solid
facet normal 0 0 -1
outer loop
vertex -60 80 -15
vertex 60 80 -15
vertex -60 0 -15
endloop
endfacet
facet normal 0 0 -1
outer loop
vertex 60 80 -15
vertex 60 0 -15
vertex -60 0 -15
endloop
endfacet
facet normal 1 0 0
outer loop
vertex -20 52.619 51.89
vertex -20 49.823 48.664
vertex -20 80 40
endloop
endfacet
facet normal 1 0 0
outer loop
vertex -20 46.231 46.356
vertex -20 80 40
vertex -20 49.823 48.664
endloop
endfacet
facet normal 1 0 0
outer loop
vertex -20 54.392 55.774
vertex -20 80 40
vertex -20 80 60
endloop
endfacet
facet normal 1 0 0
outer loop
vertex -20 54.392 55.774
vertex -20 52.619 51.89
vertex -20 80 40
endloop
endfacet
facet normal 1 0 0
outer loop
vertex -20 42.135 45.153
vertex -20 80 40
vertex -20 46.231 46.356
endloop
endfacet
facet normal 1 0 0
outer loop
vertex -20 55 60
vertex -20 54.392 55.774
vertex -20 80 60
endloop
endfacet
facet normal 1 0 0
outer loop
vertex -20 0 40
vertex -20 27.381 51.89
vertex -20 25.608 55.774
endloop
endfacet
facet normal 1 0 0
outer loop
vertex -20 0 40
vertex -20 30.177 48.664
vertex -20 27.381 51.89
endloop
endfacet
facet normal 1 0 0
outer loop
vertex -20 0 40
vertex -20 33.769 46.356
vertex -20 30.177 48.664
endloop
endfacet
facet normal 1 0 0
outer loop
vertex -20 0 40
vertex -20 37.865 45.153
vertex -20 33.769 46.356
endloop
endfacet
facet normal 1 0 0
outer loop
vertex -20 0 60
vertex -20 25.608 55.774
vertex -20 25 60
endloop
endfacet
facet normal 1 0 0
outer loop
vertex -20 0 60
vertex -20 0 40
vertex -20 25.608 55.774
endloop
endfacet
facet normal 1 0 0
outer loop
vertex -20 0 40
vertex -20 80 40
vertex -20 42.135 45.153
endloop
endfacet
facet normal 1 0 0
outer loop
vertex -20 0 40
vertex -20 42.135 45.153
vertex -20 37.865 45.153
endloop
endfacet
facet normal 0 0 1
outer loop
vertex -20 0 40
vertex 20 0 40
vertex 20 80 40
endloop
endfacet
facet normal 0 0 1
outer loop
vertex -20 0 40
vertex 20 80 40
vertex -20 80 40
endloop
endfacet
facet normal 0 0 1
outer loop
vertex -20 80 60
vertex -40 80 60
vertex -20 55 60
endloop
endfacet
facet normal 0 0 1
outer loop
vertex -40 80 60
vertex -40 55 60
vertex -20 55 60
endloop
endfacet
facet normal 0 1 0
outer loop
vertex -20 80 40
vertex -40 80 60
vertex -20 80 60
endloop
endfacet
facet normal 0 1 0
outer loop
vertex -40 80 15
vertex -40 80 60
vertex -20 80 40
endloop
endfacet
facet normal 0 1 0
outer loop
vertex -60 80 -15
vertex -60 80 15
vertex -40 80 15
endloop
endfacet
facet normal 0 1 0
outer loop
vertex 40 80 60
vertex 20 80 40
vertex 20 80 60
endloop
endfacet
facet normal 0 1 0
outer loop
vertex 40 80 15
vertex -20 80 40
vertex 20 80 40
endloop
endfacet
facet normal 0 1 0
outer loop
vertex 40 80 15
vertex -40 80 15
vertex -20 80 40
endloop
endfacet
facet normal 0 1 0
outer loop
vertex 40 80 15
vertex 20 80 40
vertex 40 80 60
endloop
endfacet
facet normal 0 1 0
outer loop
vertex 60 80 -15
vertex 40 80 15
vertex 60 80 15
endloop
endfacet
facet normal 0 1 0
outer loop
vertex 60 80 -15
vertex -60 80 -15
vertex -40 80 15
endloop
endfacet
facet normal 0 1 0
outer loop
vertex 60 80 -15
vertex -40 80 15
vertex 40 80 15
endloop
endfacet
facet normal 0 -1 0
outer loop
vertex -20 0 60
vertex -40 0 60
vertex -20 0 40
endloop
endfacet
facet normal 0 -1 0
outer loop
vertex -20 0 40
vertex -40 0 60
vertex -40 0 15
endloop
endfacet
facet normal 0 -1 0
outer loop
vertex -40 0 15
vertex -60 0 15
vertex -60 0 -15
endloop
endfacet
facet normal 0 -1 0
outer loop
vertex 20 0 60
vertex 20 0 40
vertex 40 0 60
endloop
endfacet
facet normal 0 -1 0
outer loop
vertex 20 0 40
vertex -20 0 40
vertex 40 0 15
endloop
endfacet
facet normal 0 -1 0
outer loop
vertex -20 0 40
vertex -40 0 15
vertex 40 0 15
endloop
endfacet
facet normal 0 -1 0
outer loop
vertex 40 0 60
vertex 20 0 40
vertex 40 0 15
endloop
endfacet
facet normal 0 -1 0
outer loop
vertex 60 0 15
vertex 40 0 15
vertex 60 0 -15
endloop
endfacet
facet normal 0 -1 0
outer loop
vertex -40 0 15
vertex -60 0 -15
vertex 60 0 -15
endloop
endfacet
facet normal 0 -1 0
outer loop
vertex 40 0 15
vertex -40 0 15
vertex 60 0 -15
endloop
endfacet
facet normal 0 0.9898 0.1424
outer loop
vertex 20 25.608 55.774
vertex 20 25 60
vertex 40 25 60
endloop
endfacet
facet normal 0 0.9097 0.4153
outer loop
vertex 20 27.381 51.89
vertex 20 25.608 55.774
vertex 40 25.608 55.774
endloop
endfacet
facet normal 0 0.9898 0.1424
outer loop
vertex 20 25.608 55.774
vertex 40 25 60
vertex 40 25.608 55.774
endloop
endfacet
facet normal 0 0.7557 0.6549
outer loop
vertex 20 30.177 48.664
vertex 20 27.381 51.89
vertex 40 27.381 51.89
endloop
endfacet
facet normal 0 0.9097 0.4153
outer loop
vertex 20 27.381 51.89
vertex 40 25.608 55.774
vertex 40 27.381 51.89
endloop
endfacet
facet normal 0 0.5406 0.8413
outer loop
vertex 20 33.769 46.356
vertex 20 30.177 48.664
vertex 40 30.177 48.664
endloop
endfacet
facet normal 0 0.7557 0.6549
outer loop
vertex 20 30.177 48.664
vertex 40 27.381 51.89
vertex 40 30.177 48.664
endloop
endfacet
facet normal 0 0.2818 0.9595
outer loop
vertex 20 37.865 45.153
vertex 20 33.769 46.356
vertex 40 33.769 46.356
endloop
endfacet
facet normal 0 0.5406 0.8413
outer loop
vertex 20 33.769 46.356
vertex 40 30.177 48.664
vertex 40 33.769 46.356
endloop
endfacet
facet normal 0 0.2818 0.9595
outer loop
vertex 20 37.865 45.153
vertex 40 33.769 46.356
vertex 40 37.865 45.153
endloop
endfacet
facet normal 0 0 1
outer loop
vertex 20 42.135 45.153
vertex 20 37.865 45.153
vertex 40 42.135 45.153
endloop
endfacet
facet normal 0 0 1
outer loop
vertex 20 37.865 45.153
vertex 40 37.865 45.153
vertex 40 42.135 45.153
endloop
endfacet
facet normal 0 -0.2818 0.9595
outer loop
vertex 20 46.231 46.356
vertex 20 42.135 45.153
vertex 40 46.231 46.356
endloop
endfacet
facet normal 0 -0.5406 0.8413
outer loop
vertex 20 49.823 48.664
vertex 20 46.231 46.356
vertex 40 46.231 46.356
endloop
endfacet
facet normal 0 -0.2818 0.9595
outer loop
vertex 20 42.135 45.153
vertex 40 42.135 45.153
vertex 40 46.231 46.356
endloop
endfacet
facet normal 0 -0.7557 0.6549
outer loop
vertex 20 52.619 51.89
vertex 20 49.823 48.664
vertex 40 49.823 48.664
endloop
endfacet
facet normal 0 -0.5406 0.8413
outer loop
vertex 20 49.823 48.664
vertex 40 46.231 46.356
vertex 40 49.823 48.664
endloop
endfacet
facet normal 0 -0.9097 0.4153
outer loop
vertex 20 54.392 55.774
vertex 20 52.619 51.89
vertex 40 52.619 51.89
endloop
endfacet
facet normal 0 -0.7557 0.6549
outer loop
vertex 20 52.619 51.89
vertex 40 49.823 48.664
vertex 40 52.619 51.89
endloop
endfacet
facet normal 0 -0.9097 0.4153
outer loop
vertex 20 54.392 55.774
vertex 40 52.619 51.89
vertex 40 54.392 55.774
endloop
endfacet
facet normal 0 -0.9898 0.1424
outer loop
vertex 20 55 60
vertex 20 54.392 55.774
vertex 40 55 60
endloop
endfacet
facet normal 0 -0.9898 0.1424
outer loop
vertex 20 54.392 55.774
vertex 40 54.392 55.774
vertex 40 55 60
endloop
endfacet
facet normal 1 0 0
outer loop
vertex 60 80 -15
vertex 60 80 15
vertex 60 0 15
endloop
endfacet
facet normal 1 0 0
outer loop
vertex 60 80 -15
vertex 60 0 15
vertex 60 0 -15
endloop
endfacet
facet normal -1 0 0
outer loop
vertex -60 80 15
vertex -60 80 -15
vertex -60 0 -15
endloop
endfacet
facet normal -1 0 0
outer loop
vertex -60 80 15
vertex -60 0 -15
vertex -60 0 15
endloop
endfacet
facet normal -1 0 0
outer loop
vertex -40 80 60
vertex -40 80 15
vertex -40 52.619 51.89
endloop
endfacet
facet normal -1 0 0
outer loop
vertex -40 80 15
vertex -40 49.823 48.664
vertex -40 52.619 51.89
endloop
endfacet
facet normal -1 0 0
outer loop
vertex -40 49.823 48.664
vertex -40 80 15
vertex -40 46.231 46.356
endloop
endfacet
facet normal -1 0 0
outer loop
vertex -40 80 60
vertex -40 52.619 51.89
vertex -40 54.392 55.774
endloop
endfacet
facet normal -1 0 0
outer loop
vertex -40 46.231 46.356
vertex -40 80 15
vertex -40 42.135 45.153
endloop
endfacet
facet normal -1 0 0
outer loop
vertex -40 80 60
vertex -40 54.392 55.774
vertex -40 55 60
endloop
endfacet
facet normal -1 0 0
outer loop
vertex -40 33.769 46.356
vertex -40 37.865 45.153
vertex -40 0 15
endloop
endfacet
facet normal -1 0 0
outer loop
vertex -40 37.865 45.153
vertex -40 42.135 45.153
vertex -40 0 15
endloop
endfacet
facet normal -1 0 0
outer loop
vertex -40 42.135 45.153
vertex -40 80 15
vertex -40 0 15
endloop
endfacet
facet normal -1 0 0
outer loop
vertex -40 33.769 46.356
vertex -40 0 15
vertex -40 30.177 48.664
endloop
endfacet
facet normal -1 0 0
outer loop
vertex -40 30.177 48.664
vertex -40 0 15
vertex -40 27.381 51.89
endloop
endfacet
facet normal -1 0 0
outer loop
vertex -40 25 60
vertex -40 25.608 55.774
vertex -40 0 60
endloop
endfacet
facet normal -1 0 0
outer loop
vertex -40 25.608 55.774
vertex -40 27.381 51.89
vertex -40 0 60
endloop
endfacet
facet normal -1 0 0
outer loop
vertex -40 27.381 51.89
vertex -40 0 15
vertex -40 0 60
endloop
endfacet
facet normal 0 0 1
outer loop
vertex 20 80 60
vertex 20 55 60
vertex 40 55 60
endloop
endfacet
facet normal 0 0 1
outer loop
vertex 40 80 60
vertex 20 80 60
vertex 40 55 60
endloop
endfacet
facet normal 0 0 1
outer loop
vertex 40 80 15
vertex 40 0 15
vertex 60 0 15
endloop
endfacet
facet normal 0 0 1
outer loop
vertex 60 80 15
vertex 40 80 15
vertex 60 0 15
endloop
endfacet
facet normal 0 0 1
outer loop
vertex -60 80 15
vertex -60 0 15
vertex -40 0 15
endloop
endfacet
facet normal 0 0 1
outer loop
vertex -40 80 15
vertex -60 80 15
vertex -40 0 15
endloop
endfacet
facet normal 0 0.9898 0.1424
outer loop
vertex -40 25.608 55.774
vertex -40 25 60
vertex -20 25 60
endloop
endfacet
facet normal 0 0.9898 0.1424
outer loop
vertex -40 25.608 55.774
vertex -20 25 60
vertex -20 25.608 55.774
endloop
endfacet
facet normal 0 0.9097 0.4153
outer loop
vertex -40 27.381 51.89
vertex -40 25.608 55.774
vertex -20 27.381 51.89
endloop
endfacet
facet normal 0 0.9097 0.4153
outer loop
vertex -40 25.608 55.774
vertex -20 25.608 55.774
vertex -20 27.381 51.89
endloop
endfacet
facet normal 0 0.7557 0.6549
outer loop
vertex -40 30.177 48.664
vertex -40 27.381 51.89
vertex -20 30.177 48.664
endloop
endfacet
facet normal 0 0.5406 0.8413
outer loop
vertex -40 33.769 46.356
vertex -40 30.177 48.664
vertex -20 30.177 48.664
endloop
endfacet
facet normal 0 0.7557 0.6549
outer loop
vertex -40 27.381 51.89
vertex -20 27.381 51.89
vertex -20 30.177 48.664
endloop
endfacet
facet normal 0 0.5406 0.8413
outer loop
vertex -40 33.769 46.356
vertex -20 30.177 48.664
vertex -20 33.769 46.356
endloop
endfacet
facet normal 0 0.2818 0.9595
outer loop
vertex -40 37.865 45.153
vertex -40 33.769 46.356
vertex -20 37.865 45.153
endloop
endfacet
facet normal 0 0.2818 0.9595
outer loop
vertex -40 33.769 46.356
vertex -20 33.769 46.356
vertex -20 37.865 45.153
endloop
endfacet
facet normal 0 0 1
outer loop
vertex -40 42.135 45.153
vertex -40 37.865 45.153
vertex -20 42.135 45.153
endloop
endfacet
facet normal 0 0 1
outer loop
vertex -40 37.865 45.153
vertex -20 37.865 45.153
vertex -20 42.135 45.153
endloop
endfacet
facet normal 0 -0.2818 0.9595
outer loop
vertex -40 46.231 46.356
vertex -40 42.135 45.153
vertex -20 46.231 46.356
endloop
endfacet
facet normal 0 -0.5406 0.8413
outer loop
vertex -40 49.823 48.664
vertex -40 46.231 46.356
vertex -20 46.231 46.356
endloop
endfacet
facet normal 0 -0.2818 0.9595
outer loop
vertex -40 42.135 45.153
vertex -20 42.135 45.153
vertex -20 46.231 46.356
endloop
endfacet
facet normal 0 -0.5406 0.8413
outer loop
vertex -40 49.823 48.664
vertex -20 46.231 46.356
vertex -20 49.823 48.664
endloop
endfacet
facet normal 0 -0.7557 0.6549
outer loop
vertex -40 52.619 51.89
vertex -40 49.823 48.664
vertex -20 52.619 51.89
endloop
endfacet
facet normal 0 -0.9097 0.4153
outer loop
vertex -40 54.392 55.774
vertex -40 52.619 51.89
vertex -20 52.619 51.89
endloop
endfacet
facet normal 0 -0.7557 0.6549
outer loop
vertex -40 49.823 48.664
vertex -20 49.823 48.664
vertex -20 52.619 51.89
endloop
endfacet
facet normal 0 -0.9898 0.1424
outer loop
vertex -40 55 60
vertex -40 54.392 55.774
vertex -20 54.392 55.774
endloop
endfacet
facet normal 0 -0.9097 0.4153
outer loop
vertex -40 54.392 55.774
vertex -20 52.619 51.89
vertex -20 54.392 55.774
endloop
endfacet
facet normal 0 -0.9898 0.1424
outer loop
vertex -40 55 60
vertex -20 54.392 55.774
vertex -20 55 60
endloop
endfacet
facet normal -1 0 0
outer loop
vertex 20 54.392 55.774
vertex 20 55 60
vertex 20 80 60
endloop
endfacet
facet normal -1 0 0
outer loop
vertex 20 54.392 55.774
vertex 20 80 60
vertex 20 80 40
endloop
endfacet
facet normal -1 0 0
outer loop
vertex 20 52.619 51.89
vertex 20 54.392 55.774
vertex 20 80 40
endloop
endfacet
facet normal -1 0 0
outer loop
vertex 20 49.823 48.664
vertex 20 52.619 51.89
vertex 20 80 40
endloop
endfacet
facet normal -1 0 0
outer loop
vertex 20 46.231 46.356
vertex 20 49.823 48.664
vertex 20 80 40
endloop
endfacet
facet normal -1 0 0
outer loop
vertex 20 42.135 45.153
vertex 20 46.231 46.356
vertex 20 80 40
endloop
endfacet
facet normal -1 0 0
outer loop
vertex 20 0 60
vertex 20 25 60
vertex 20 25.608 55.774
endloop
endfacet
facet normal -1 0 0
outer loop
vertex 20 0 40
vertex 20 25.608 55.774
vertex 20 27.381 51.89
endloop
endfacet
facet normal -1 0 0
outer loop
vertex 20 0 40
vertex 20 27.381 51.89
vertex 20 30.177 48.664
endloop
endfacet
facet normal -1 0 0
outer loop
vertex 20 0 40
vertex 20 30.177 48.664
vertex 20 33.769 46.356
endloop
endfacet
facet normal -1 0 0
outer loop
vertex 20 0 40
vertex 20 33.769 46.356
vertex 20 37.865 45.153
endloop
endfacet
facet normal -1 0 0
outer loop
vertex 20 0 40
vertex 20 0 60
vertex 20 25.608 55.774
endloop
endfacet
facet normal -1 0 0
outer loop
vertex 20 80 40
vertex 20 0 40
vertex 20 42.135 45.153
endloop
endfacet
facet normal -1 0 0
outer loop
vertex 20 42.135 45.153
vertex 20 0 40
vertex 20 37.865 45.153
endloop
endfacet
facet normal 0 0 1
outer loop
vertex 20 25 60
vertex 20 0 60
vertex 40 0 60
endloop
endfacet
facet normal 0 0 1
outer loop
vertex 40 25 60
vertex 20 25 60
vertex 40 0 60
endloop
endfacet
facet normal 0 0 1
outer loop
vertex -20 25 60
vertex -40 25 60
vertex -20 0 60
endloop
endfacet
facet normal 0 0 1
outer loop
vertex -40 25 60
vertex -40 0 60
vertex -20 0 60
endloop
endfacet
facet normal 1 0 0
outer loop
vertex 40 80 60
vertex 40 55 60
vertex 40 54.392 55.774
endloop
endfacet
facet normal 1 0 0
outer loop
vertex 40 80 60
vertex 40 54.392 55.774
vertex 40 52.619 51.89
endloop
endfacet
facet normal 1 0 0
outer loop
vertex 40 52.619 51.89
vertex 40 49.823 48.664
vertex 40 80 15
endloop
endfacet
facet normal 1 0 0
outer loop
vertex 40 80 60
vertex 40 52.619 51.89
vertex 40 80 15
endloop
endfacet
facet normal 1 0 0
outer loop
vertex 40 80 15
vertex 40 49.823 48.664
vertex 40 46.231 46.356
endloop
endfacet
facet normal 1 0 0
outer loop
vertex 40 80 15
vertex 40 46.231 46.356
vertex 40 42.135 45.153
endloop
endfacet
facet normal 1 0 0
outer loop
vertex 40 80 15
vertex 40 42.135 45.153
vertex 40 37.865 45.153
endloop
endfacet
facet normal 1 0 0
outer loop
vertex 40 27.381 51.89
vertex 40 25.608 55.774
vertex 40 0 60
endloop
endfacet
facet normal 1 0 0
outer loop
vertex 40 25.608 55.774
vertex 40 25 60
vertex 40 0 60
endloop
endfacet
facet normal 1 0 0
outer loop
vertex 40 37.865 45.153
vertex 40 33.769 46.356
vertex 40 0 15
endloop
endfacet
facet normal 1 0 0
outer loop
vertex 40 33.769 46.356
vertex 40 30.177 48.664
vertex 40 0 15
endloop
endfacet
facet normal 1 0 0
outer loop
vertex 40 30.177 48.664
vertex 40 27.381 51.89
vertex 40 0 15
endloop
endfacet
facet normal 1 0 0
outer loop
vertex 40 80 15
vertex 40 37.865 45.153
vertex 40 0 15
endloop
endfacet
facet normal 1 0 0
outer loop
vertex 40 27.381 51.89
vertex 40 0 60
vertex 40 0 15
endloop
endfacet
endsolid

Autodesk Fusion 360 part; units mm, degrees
sketch "Sketch1" plane through (0, 0, 0) normal (0, 1, 0) x (1, 0, 0)
  line L0 (60, 15) -> (-60, 15)
  line L1 (-60, 15) -> (-60, -15)
  line L2 (-60, -15) -> (60, -15)
  line L3 (60, -15) -> (60, 15)
  line L4 (60, 15) -> (-60, -15) construction
  line L5 (-60, 15) -> (60, -15) construction
  line L6 (0, -15) -> (0, -60)
  line L7 (40, -15) -> (-40, -15)
  line L8 (-40, -15) -> (-40, -60)
  line L9 (-40, -60) -> (40, -60)
  line L10 (40, -60) -> (40, -15)
  line L11 (40, -15) -> (-40, -60) construction
  line L12 (-40, -15) -> (40, -60) construction
  line L13 (20, -40) -> (-20, -40)
  line L14 (-20, -40) -> (-20, -80)
  line L15 (-20, -80) -> (20, -80)
  line L16 (20, -80) -> (20, -40)
  line L17 (20, -40) -> (-20, -80) construction
  line L18 (-20, -40) -> (20, -80) construction
  point P0 (0, -37.5)
  point P1 (0, -60)
  dimension "d1" = 120
  dimension "d2" = 30
  dimension "d3" = 45
  dimension "d4" = 80
  dimension "d5" = 40
  dimension "d6" = 40
extrude "Extrude1" add sketch "Sketch1" along normal blind 80 contours L0 L1 L2 L3 L7 | L2 L6 L7 L9 L10 L13 L16 | L2 L6 L7 L8 L9 L13 L14
sketch "Sketch2" plane through (40, 0, 0) normal (1, 0, 0) x (0, 1, 0)
  line L0 (0, 60) -> (0, 15)
  line L1 (0, 15) -> (80, 15)
  line L2 (80, 15) -> (80, 60)
  line L3 (80, 60) -> (0, 60)
  circle A0 centre (40, 60) radius 15
  dimension "d9" = 30
extrude "Extrude2" cut sketch "Sketch2" against normal blind 100 contours L3 A0 | L3 A0
